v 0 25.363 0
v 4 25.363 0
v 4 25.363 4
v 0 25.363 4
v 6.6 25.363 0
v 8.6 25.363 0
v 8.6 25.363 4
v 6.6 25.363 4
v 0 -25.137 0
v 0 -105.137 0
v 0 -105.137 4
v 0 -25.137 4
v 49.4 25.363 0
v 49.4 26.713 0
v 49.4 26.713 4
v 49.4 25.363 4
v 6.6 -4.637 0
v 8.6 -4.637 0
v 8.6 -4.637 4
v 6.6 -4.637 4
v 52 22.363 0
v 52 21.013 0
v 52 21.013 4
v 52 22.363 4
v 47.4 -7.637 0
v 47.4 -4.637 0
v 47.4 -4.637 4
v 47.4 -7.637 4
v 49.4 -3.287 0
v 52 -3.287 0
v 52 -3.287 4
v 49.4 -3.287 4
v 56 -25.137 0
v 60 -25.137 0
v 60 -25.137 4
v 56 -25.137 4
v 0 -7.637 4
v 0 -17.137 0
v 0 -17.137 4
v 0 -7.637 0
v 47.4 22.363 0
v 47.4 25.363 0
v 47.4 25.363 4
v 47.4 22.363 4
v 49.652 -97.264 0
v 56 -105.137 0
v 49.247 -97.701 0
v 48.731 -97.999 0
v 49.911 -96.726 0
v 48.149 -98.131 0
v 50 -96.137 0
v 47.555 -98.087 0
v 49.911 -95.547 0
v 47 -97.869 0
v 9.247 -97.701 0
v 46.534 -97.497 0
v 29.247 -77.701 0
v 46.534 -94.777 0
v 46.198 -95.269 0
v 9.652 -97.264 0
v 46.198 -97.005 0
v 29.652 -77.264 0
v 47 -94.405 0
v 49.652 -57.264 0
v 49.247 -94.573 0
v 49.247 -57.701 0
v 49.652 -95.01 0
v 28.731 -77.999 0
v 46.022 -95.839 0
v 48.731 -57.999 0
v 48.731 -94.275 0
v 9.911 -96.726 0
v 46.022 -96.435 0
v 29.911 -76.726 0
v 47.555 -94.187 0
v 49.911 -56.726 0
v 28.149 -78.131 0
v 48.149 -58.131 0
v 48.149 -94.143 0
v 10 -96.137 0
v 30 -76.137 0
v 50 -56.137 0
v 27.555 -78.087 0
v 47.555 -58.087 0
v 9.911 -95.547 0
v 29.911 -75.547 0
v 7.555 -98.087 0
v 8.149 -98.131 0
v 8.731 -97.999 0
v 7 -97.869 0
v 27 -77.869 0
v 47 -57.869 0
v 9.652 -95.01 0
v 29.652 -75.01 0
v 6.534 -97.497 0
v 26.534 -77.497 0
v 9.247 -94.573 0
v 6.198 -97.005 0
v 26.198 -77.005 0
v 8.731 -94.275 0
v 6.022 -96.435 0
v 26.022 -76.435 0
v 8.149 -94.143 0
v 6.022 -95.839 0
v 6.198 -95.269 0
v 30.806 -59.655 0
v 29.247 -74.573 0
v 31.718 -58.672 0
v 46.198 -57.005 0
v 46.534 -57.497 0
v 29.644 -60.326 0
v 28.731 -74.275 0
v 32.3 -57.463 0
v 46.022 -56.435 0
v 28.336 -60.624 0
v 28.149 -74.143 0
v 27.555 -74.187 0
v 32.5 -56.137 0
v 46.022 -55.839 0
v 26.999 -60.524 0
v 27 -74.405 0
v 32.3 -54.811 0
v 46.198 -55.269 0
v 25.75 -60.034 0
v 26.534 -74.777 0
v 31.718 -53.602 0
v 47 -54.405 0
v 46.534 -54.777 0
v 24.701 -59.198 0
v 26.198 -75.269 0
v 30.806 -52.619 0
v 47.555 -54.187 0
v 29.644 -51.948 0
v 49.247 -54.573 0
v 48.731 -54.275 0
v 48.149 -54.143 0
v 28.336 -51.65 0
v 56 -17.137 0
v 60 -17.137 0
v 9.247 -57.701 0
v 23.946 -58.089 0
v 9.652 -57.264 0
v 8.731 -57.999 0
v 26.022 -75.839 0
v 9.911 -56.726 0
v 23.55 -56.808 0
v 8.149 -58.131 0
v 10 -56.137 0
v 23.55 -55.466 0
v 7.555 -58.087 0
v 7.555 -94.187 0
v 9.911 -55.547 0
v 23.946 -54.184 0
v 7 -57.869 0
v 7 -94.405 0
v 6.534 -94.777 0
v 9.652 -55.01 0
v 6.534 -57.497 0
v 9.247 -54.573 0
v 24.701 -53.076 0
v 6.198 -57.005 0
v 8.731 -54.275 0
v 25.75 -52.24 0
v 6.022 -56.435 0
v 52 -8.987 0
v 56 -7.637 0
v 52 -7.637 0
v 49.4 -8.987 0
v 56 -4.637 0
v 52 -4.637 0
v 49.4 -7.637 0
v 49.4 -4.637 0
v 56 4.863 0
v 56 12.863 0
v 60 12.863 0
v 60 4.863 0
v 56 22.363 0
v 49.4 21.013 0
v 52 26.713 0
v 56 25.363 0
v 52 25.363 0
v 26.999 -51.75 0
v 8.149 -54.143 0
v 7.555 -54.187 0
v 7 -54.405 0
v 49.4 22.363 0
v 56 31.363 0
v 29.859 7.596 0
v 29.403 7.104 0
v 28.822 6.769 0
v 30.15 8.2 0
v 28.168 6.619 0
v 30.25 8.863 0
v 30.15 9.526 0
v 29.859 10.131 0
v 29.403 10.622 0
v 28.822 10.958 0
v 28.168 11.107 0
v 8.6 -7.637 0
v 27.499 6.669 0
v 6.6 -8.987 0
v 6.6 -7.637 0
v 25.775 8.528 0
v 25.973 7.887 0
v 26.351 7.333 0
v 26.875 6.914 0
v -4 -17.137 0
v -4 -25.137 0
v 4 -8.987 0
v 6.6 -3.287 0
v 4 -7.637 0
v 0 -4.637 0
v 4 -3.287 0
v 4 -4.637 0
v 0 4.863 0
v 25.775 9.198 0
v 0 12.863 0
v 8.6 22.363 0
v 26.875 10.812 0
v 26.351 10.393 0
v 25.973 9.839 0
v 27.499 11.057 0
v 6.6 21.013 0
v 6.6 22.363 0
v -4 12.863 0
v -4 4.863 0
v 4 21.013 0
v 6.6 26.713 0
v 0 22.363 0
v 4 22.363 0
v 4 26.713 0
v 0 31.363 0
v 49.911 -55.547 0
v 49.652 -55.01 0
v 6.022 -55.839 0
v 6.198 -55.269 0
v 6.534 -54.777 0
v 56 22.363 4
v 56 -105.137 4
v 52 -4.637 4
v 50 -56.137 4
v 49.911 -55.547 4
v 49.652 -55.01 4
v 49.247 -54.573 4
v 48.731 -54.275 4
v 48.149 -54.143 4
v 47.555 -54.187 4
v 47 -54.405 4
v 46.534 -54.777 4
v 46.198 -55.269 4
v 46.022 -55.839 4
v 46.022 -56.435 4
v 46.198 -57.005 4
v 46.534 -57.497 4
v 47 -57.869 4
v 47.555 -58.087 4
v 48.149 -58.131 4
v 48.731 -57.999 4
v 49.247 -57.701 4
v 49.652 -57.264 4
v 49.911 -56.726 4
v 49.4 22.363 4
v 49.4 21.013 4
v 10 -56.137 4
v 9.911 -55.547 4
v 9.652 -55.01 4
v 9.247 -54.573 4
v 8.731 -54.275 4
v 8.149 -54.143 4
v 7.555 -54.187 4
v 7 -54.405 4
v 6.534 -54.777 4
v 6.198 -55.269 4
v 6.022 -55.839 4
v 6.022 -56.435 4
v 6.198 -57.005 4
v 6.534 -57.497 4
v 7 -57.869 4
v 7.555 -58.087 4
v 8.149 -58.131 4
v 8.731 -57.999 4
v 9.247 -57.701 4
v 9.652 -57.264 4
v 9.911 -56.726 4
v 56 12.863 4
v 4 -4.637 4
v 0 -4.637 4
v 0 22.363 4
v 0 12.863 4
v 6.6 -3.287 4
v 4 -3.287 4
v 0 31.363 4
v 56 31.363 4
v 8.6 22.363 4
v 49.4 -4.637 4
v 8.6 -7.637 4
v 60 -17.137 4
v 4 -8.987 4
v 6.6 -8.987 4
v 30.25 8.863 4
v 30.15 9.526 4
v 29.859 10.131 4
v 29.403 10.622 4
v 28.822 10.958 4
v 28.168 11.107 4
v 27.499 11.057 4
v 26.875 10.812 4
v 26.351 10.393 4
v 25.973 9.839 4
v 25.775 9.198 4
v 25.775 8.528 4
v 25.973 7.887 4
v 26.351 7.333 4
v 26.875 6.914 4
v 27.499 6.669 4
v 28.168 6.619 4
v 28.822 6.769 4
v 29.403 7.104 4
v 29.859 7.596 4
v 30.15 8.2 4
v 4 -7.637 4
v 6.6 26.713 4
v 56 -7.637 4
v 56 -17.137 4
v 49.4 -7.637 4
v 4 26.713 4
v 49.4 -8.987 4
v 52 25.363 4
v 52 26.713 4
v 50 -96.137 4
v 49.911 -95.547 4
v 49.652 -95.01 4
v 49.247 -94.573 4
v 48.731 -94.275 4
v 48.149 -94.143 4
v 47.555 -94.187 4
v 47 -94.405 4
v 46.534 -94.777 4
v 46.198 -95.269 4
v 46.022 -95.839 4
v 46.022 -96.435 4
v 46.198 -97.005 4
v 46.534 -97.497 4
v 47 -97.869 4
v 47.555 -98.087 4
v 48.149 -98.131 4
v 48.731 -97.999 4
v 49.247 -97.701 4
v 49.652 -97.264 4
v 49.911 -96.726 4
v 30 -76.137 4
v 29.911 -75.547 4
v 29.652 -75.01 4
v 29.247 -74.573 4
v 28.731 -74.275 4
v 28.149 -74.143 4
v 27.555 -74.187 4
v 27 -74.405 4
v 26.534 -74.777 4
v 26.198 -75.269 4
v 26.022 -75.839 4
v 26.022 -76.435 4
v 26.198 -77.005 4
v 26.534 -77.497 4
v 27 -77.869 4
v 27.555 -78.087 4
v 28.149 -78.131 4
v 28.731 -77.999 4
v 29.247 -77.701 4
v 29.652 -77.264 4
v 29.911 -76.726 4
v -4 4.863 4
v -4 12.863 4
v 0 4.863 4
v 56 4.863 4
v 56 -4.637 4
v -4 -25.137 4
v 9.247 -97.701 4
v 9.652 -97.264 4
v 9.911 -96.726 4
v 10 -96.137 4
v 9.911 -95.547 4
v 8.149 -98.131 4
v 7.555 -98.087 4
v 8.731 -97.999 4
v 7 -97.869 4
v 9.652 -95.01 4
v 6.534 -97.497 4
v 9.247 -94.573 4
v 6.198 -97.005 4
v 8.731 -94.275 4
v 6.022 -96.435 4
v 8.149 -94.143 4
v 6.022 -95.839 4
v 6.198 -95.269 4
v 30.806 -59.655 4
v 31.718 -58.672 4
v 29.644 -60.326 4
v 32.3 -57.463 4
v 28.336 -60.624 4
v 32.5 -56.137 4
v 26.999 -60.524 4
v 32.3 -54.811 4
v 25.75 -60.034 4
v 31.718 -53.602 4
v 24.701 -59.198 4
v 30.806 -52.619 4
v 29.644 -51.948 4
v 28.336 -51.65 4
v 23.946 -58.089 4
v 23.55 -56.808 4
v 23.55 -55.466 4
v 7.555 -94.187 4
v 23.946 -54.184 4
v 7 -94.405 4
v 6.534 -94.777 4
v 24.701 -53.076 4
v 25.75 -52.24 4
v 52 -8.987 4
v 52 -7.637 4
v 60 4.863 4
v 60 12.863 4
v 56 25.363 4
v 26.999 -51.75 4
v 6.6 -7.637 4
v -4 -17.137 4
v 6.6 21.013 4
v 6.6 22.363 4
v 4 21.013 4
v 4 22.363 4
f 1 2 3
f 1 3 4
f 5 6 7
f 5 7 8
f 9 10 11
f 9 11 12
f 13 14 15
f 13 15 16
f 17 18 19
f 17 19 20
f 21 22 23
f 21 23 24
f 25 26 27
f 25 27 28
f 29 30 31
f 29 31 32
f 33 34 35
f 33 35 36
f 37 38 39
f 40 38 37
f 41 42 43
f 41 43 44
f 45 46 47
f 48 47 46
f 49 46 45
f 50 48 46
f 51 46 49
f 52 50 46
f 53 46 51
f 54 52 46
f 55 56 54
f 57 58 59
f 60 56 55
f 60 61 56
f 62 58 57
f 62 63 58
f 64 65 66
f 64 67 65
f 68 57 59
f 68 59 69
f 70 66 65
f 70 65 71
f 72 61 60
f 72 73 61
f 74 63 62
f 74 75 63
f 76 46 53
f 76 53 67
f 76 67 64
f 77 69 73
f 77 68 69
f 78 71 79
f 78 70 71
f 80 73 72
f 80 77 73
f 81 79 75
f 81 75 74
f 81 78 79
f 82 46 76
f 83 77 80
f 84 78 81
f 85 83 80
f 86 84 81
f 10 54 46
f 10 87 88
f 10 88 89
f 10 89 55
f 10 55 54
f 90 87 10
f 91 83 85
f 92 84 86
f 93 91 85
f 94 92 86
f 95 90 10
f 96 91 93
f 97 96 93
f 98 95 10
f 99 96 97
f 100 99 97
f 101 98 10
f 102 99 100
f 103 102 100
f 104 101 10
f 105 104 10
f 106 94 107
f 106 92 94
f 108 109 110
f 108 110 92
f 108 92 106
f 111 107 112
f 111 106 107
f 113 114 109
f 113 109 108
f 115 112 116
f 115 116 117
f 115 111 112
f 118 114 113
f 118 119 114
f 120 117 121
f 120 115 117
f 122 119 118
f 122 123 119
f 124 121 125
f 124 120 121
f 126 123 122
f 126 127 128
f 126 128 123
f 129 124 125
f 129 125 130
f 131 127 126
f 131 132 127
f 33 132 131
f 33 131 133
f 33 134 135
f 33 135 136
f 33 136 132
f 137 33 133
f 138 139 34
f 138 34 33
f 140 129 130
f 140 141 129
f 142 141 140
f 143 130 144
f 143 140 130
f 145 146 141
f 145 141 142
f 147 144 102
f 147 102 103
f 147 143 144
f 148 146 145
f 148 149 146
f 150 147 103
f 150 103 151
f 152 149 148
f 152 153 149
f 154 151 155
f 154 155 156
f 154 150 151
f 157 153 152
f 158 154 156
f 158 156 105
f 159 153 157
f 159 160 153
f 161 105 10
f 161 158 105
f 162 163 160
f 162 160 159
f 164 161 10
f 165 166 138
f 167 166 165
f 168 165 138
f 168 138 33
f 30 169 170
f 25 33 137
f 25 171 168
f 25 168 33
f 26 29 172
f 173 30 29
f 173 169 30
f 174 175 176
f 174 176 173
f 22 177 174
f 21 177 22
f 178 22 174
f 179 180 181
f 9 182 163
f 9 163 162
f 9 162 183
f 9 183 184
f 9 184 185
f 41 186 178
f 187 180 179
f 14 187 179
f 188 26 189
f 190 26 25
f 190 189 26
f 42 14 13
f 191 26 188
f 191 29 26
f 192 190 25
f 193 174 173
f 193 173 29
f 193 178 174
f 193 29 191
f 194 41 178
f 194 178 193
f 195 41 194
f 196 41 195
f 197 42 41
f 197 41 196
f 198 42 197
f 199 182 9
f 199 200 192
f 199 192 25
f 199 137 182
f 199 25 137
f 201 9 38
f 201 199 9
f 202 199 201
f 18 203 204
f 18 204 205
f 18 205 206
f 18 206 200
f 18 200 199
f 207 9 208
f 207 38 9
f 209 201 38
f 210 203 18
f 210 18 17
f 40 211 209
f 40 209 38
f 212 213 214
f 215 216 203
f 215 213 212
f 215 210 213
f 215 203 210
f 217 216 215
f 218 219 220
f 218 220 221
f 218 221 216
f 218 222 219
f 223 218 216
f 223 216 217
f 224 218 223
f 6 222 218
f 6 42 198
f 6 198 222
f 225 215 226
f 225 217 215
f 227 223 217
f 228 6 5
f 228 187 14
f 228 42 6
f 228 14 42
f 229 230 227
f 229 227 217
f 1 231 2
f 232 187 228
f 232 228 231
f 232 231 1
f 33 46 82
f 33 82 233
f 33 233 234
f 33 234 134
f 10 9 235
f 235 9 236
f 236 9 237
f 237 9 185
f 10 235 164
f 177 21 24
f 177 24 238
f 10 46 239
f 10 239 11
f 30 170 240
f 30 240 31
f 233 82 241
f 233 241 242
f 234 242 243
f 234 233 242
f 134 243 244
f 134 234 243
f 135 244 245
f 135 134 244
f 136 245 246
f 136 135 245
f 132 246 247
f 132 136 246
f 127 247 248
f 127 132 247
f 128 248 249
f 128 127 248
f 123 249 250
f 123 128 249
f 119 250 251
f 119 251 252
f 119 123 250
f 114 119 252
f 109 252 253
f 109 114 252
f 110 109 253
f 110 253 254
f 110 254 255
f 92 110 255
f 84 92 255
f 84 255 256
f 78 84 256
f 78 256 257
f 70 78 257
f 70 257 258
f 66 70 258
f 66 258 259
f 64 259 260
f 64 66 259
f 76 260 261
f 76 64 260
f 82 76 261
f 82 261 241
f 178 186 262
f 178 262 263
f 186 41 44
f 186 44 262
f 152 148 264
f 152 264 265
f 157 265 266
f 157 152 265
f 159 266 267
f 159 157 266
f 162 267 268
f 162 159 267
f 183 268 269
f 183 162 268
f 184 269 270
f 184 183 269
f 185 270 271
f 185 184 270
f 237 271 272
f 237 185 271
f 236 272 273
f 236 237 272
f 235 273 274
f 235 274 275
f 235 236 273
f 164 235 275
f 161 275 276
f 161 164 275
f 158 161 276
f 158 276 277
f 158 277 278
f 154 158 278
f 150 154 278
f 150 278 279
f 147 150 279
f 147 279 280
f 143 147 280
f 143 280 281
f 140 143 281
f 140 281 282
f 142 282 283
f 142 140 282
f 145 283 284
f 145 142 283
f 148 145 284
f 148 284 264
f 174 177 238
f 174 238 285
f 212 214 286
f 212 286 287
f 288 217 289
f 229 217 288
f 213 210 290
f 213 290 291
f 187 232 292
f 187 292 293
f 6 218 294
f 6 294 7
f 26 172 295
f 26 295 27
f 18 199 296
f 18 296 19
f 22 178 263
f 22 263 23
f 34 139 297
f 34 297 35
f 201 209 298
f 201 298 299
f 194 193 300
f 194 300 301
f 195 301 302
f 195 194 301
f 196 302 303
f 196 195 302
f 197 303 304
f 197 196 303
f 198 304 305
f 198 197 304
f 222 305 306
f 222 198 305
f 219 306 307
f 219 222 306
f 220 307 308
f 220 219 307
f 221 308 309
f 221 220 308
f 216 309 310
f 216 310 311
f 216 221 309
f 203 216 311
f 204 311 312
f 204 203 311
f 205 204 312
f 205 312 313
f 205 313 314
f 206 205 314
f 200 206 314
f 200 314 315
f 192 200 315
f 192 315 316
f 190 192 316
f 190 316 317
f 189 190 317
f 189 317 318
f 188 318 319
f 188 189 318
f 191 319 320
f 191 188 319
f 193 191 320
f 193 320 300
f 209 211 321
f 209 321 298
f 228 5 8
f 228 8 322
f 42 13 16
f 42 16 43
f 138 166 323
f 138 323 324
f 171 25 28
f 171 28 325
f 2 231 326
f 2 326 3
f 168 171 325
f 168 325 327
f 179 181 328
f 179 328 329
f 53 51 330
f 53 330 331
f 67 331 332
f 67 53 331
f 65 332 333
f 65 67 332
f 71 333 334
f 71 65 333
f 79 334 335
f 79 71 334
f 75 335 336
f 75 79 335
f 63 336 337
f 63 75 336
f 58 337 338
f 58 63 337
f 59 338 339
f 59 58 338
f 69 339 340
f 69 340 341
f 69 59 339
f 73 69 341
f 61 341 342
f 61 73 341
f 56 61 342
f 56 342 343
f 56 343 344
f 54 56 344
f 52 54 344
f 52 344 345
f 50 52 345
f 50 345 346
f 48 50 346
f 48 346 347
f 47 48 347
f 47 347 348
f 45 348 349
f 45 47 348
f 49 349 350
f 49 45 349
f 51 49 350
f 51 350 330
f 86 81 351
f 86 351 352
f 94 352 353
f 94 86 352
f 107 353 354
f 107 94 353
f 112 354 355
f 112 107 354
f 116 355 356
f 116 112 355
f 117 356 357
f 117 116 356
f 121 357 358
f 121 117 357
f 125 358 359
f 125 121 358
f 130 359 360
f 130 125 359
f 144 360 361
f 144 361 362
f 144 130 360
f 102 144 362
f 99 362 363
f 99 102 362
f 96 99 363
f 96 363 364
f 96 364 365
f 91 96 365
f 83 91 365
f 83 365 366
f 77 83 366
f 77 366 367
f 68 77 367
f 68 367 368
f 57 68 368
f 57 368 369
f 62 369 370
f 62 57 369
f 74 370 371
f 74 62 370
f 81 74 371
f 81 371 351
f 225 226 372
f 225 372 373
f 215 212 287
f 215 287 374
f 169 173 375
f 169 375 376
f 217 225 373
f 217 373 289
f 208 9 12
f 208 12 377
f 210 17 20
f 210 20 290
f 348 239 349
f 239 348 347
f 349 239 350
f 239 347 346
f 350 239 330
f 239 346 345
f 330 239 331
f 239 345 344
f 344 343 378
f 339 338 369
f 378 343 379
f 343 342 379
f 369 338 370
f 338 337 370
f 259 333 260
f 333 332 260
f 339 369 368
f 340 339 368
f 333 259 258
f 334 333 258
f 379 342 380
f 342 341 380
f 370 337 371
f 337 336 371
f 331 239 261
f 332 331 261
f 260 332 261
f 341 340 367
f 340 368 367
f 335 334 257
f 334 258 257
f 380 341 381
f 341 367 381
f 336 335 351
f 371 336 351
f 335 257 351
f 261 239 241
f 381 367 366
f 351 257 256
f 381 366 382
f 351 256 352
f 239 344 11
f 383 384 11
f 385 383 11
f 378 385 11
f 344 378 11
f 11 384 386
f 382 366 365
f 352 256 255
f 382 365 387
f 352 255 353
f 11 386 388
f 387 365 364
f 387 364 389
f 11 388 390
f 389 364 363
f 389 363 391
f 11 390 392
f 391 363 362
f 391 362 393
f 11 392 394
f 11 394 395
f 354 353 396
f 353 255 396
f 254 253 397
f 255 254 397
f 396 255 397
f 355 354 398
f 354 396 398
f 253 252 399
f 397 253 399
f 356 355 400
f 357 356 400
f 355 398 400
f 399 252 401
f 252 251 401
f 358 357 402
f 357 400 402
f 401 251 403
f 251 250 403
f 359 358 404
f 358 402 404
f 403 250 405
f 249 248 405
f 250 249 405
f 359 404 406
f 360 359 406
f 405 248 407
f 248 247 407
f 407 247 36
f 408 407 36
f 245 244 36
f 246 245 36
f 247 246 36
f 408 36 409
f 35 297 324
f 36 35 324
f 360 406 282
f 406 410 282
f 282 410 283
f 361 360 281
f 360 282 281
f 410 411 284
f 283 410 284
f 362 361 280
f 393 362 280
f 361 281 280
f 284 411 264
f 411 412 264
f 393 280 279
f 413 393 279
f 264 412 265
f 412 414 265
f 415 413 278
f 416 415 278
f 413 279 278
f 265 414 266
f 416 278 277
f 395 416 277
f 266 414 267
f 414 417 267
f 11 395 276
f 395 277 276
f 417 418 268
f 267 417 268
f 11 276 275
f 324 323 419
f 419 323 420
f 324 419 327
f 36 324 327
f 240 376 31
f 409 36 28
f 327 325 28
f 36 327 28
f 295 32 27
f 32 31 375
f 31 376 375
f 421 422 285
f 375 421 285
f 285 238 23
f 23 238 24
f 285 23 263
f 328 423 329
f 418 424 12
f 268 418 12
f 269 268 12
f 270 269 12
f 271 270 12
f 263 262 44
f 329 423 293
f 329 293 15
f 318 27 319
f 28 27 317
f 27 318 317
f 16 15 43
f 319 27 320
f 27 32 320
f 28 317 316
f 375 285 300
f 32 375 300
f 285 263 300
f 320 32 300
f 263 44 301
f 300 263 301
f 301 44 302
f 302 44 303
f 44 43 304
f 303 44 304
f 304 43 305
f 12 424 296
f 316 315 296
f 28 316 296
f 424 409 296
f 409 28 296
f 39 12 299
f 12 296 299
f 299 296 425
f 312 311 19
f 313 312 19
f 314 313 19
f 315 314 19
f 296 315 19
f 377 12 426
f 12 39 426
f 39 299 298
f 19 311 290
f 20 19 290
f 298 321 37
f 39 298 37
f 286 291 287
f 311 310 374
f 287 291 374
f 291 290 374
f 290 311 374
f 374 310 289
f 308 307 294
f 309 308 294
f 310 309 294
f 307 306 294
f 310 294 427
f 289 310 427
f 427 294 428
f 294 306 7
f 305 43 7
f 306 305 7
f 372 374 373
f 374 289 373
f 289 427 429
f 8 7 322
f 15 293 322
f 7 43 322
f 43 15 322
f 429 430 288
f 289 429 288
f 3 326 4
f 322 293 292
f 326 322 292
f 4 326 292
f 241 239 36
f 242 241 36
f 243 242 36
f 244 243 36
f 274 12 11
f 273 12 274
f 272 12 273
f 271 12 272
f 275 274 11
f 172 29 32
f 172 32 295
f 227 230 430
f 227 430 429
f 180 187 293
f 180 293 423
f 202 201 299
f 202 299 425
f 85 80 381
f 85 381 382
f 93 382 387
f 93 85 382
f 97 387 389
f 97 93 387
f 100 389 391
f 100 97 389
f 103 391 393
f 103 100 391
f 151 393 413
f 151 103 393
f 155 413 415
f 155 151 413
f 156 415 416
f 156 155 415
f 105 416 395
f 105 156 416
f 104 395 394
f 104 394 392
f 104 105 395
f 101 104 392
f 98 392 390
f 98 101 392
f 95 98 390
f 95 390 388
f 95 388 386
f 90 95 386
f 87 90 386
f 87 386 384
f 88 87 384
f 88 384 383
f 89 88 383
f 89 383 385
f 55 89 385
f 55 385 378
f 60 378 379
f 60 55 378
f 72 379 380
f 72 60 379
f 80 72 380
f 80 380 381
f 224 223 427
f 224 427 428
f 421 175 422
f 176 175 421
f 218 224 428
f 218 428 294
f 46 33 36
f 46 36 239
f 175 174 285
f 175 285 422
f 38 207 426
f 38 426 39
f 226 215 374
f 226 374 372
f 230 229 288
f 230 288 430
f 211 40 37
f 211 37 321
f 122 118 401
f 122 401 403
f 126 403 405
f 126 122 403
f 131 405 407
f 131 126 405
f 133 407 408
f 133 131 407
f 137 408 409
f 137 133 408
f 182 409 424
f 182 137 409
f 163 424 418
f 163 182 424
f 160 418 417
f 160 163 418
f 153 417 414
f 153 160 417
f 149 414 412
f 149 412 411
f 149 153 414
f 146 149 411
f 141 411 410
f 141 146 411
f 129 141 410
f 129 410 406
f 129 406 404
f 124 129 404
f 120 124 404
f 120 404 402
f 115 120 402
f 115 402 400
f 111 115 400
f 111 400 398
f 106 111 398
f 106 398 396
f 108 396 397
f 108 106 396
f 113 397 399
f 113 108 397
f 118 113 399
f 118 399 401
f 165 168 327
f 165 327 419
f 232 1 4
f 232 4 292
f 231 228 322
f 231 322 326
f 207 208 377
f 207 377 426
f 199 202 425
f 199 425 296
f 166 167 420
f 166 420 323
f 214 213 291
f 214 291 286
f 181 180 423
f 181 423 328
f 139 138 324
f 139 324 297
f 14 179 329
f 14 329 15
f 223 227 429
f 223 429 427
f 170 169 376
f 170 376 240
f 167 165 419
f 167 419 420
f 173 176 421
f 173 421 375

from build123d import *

# Parameters (mm, degrees)
SKETCH_1_R      = 2.25
SKETCH_1_R_2    = 4.5
SKETCH_1_R_3    = 2
EXTRUDE_1_DEPTH = 4


with BuildPart() as part:
    # 草图1 → 凸台-拉伸1 (new body)
    with BuildSketch(Plane.XY):
        Polygon((0, 4.863043478), (-4, 4.863043478), (-4, 12.863043478), (0, 12.863043478), (0, 22.363043478), (4, 22.363043478), (4, 21.013043478), (6.6, 21.013043478), (6.6, 22.363043478), (8.6, 22.363043478), (8.6, 25.363043478), (6.6, 25.363043478), (6.6, 26.713043478), (4, 26.713043478), (4, 25.363043478), (0, 25.363043478), (0, 31.363043478), (56, 31.363043478), (56, 25.363043478), (52, 25.363043478), (52, 26.713043478), (49.4, 26.713043478), (49.4, 25.363043478), (47.4, 25.363043478), (47.4, 22.363043478), (49.4, 22.363043478), (49.4, 21.013043478), (52, 21.013043478), (52, 22.363043478), (56, 22.363043478), (56, 12.863043478), (60, 12.863043478), (60, 4.863043478), (56, 4.863043478), (56, -4.636956522), (52, -4.636956522), (52, -3.286956522), (49.4, -3.286956522), (49.4, -4.636956522), (47.4, -4.636956522), (47.4, -7.636956522), (49.4, -7.636956522), (49.4, -8.986956522), (52, -8.986956522), (52, -7.636956522), (56, -7.636956522), (56, -17.136956522), (60, -17.136956522), (60, -25.136956522), (56, -25.136956522), (56, -105.136956522), (0, -105.136956522), (0, -25.136956522), (-4, -25.136956522), (-4, -17.136956522), (0, -17.136956522), (0, -7.636956522), (4, -7.636956522), (4, -8.986956522), (6.6, -8.986956522), (6.6, -7.636956522), (8.6, -7.636956522), (8.6, -4.636956522), (6.6, -4.636956522), (6.6, -3.286956522), (4, -3.286956522), (4, -4.636956522), (0, -4.636956522), align=None)
        with Locations((28, 8.863043478)):
            Circle(SKETCH_1_R, mode=Mode.SUBTRACT)
        with Locations((28, -56.136956522)):
            Circle(SKETCH_1_R_2, mode=Mode.SUBTRACT)
        with Locations((8, -56.136956522)):
            Circle(SKETCH_1_R_3, mode=Mode.SUBTRACT)
        with Locations((28, -76.136956522)):
            Circle(SKETCH_1_R_3, mode=Mode.SUBTRACT)
        with Locations((48, -56.136956522)):
            Circle(SKETCH_1_R_3, mode=Mode.SUBTRACT)
        with Locations((48, -96.136956522)):
            Circle(SKETCH_1_R_3, mode=Mode.SUBTRACT)
        with Locations((8, -96.136956522)):
            Circle(SKETCH_1_R_3, mode=Mode.SUBTRACT)
    extrude(amount=EXTRUDE_1_DEPTH)


solid = part.part
